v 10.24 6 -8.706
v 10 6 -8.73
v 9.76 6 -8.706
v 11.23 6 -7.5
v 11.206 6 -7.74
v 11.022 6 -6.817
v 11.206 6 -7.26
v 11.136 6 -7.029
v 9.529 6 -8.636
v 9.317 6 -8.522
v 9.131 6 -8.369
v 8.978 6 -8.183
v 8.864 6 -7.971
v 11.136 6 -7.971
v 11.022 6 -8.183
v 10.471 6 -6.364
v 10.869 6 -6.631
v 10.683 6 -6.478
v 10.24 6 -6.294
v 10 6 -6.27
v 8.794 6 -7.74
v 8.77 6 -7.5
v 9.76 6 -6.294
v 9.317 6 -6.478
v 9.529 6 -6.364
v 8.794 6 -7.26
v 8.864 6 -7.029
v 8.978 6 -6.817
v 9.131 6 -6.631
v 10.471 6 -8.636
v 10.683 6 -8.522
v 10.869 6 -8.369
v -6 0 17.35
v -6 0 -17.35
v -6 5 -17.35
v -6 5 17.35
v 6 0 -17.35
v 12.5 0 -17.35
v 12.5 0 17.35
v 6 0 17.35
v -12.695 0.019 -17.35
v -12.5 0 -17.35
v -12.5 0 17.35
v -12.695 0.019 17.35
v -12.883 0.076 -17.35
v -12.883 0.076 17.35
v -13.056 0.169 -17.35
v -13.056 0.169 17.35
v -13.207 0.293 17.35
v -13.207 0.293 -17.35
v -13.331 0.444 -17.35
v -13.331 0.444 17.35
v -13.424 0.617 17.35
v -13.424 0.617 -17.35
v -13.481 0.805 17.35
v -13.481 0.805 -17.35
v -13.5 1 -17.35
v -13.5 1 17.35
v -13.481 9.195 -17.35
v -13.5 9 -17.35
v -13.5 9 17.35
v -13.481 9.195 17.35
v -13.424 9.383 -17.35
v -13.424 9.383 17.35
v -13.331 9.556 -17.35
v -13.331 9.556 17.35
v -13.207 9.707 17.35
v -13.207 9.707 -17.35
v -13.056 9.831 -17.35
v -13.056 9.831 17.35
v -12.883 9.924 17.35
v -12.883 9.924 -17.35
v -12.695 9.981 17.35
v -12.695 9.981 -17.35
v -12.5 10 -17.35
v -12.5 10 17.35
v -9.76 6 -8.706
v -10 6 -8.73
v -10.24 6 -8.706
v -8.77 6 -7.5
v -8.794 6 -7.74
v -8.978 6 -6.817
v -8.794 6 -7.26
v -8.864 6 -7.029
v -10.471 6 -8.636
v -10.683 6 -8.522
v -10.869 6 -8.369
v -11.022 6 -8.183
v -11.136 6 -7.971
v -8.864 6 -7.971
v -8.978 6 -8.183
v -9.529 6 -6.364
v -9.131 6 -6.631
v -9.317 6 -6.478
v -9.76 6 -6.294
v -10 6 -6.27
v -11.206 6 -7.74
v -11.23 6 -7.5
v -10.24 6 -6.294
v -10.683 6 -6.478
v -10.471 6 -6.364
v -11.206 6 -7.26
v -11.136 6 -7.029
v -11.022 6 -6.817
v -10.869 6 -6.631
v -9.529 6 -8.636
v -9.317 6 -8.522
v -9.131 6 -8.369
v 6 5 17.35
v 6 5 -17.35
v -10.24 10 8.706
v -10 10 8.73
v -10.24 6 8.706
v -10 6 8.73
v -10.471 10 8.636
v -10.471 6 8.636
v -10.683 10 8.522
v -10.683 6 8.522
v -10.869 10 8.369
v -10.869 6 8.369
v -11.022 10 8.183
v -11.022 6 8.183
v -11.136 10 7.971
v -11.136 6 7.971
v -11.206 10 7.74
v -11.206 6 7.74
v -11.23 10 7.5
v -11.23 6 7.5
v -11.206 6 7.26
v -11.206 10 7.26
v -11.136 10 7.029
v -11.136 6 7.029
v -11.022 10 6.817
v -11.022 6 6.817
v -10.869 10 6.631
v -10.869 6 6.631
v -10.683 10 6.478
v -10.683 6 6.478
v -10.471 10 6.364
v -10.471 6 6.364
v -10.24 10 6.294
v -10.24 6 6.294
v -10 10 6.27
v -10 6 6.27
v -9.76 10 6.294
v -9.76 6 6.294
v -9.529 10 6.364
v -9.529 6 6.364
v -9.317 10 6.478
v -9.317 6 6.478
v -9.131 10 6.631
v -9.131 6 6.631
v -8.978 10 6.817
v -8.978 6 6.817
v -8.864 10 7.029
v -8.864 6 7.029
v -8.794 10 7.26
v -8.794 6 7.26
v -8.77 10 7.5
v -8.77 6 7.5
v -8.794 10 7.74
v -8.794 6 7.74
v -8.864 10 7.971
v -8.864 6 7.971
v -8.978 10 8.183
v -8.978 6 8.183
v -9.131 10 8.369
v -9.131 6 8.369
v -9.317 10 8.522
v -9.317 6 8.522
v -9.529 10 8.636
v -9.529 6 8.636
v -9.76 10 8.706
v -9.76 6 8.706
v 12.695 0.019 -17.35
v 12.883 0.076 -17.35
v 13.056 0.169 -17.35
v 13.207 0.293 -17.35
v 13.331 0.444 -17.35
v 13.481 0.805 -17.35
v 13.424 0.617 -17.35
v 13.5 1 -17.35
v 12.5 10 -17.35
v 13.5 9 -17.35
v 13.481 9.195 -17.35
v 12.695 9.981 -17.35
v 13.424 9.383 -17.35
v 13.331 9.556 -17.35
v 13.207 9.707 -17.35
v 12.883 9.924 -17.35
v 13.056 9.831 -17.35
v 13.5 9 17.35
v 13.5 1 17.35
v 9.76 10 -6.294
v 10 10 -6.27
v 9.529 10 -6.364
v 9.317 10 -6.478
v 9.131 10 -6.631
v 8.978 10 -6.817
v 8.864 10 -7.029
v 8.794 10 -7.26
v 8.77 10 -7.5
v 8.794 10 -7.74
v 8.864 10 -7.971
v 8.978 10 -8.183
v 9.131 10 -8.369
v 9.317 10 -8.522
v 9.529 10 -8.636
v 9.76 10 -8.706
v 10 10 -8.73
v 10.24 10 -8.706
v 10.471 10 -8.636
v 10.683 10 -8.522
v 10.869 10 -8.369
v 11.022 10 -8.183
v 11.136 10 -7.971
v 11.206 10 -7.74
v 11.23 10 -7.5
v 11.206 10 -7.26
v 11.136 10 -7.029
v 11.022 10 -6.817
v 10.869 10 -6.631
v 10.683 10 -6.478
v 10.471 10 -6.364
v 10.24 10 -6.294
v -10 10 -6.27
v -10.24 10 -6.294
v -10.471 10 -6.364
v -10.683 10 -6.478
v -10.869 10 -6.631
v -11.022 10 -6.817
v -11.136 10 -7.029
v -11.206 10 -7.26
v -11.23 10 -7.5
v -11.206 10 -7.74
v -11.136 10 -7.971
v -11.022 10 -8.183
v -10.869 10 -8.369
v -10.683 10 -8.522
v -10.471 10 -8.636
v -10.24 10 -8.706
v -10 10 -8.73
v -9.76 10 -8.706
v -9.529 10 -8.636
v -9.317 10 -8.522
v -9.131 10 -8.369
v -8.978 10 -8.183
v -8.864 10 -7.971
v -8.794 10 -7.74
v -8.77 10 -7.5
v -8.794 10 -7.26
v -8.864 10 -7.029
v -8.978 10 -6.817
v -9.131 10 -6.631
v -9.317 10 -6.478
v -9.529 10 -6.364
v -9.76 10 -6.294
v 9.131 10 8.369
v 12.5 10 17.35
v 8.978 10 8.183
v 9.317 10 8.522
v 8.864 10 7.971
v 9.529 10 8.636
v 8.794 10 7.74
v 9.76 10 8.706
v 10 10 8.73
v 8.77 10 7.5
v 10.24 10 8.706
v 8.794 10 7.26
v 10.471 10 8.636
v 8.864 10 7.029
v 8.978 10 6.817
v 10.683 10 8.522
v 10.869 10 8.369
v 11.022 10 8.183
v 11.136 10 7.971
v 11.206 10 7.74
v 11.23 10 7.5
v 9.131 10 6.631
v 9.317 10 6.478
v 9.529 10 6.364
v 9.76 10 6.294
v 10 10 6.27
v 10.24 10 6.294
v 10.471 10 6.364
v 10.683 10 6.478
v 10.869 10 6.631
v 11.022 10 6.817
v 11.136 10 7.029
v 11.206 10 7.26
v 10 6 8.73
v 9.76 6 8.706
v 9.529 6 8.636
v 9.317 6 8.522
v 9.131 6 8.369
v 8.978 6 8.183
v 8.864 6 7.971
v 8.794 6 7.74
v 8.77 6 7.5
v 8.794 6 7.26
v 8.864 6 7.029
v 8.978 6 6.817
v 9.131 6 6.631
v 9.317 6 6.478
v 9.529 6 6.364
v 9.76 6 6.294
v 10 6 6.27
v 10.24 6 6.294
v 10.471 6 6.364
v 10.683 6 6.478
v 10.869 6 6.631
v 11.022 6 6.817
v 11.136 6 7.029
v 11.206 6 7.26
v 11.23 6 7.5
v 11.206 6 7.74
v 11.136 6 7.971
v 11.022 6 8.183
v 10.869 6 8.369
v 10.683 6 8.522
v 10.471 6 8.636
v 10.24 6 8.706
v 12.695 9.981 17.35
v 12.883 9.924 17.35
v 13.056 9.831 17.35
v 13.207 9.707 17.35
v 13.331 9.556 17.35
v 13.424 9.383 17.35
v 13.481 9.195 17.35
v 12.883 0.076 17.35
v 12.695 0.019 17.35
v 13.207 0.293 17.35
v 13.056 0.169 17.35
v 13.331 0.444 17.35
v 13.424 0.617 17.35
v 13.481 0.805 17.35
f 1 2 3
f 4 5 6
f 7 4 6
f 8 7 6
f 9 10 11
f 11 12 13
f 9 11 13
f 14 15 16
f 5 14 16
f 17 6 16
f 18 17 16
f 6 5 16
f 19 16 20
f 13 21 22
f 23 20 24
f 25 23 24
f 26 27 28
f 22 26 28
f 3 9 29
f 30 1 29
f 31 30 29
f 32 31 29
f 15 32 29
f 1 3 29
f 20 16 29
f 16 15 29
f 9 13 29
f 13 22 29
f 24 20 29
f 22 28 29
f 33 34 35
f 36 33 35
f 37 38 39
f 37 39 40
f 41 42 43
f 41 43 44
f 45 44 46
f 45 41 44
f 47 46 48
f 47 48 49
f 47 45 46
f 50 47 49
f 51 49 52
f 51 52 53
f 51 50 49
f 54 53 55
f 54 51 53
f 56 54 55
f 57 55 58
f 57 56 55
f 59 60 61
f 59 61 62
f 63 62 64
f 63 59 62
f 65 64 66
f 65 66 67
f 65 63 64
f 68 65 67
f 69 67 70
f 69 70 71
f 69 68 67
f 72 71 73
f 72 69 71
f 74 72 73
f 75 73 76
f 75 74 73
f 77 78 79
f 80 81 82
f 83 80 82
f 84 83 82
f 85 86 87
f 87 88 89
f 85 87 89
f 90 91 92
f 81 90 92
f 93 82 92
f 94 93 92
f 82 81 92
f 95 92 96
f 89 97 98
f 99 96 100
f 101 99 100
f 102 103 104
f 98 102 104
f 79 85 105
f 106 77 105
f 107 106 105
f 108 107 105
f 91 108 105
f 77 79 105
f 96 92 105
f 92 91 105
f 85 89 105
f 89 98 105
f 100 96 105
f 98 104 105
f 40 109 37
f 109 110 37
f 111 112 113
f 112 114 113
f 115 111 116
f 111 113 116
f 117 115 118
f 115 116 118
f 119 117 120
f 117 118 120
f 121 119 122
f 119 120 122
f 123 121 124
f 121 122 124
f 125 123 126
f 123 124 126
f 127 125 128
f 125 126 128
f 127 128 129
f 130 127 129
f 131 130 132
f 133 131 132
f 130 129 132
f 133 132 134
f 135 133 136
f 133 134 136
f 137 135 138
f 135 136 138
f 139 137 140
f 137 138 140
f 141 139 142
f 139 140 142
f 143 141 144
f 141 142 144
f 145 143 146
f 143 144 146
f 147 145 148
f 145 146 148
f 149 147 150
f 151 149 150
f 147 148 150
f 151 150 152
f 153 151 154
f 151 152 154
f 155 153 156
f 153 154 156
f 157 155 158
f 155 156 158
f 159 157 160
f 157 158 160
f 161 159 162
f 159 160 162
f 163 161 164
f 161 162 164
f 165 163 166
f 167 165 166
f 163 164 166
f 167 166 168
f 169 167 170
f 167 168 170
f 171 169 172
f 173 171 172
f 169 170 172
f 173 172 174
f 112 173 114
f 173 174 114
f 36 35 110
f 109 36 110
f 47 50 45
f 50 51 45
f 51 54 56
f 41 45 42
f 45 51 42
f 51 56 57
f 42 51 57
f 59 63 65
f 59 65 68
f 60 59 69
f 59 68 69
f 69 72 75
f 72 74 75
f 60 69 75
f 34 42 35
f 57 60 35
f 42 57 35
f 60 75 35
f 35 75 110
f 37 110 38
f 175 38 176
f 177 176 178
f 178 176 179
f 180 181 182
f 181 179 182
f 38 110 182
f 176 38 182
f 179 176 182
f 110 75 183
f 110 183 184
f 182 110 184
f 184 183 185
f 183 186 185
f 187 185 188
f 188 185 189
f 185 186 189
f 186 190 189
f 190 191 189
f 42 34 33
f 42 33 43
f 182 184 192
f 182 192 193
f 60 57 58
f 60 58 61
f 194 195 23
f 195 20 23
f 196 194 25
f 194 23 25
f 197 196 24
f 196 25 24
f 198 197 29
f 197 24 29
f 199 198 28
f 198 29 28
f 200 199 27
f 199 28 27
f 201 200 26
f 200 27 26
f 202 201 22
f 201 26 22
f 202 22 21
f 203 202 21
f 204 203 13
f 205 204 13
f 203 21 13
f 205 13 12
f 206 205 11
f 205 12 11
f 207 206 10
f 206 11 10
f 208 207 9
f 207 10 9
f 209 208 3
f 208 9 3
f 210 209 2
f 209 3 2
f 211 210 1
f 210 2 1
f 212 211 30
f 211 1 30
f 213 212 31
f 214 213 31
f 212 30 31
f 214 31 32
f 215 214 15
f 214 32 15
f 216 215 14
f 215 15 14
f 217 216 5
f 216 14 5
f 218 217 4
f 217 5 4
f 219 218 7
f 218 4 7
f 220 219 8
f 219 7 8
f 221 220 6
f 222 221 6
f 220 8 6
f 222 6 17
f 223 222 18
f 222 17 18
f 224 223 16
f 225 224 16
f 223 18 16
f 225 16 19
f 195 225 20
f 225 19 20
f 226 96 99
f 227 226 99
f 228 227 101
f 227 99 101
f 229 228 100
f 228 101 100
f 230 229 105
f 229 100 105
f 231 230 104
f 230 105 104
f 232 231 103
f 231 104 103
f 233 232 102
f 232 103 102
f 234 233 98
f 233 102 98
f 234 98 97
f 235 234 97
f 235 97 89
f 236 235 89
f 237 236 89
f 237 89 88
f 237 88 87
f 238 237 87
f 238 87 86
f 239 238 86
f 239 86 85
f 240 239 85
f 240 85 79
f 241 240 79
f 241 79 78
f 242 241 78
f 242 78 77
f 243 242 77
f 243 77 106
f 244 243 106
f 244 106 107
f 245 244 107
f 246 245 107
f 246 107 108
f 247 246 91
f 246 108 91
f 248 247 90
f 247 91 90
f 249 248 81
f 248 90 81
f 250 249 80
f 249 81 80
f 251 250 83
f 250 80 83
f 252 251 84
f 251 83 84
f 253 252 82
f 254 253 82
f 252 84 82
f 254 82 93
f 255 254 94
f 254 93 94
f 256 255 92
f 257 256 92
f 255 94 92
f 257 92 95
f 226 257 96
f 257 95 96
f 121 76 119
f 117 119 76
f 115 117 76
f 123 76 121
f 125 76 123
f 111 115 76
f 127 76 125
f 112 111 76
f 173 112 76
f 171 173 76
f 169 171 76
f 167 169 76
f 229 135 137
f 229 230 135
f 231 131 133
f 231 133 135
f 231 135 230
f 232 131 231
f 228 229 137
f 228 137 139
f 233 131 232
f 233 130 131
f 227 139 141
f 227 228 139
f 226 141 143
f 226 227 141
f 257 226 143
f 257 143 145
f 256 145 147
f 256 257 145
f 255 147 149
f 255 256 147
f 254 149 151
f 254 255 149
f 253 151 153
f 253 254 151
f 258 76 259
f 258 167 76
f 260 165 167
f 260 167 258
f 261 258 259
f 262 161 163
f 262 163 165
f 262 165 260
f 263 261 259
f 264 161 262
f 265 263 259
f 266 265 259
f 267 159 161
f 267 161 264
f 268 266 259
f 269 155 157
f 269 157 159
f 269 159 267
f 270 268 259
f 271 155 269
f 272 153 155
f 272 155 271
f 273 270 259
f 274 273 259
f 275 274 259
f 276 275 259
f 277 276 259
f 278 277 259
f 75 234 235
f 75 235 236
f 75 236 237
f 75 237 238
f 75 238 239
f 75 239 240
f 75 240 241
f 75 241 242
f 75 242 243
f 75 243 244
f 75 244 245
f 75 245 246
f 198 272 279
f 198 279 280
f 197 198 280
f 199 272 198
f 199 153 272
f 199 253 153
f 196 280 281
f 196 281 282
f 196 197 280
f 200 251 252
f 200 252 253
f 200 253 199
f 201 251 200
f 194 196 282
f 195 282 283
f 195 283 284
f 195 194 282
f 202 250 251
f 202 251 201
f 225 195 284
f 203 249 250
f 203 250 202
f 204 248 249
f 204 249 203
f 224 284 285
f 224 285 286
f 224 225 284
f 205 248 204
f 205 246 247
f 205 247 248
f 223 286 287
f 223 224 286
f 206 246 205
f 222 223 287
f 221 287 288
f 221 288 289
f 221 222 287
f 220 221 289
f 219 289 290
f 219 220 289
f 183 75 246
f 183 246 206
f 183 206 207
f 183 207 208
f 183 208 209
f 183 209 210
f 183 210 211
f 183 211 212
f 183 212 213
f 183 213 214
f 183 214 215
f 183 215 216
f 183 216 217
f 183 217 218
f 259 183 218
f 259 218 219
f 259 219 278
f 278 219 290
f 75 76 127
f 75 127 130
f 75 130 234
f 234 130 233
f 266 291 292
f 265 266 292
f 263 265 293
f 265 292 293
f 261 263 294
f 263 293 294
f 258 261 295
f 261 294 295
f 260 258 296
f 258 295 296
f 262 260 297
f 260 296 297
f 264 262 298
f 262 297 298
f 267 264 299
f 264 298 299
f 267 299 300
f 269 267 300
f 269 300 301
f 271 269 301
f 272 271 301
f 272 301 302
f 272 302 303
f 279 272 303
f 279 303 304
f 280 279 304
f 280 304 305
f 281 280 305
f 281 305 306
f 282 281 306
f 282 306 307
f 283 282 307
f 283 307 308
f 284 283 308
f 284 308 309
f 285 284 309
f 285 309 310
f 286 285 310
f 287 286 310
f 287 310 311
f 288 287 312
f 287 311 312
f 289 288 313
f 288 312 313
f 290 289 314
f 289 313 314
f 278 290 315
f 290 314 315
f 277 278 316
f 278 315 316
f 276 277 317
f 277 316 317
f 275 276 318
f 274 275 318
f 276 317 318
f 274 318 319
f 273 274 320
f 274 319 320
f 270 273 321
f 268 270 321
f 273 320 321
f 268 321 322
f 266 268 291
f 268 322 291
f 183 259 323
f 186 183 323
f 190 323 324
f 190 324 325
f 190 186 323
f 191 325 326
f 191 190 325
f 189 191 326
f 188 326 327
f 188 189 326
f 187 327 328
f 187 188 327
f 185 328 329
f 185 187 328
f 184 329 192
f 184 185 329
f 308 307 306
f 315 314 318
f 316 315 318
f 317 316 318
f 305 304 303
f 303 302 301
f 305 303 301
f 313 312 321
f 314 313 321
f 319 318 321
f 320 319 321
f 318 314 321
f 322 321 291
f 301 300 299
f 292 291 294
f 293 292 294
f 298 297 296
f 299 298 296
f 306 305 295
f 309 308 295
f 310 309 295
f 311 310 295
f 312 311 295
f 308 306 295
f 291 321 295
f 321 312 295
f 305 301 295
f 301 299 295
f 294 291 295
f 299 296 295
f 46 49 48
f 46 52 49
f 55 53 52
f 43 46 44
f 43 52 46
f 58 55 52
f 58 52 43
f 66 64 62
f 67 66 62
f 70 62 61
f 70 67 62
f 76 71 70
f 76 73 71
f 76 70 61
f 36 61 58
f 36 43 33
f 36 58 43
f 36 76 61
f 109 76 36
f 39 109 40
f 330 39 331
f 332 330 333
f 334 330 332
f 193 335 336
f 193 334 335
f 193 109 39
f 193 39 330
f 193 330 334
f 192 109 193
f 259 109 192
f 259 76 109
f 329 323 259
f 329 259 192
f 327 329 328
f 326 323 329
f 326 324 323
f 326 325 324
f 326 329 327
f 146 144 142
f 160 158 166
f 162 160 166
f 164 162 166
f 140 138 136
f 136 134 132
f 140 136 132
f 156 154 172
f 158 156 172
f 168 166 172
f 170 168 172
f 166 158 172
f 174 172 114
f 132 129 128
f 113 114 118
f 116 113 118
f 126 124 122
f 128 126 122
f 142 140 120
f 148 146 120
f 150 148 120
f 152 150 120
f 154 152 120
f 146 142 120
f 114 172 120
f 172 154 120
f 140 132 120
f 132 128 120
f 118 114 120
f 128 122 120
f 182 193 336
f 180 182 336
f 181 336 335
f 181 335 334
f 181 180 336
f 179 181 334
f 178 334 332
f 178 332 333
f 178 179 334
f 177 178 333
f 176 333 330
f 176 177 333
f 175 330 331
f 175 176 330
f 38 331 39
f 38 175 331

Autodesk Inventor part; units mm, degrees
ref_plane "YZ Plane" through (0, 0, 0) normal (1, 0, 0) x (0, 1, 0)
ref_plane "XZ Plane" through (0, 0, 0) normal (0, 1, 0) x (-1, 0, 0)
ref_plane "XY Plane" through (0, 0, 0) normal (0, 0, 1) x (1, 0, 0)
sketch "Sketch1" plane through (0, 0, 0) normal (0, 0, 1) x (1, 0, 0)
  line L0 (-6, 5) -> (6, 5)
  line L1 (6, 5) -> (6, 0)
  line L2 (6, 0) -> (-6, 0)
  line L3 (-6, 0) -> (-6, 5)
  line L4 (-6, 5) -> (6, 0) construction
  line L5 (6, 5) -> (-6, 0) construction
  line L6 (-13.5, 10) -> (13.5, 10)
  line L7 (13.5, 10) -> (13.5, 0)
  line L8 (13.5, 0) -> (-13.5, 0)
  line L9 (-13.5, 0) -> (-13.5, 10)
  line L10 (-13.5, 10) -> (13.5, 0) construction
  line L11 (13.5, 10) -> (-13.5, 0) construction
  point P0 (0, 0)
  point P1 (0, 2.5)
  point P2 (0, 0)
  point P3 (0, 5)
  point P4 (6, 0)
  point P5 (-6, 0)
  dimension "d0" = 12
  dimension "d1" = 5
  dimension "d2" = 27
  dimension "d3" = 10
extrude "Extrusion1" add sketch "Sketch1" along normal mid plane 34.7 contours L3 L8 L9 L6 L7 L1 L0
sketch "Sketch2" plane through (-13.5, 10, 17.35) normal (0, 1, 0) x (1, 0, 0)
  line L0 (23.5, 9.85) -> (3.5, 9.85) construction
  line L1 (3.5, 9.85) -> (3.5, 24.85) construction
  line L2 (3.5, 24.85) -> (23.5, 24.85) construction
  line L3 (23.5, 24.85) -> (23.5, 9.85) construction
  line L4 (23.5, 9.85) -> (3.5, 24.85) construction
  line L5 (3.5, 9.85) -> (23.5, 24.85) construction
  point P0 (13.5, 17.35)
  dimension "d6" = 20
  dimension "d7" = 15
hole "Hole1" at (-10, 10, 7.5) at (10, 10, 7.5) at (10, 10, -7.5) at (-10, 10, -7.5) direction (0, -1, 0) diameter 2.459 depth 4 thread size "M3x0.5" class "6H" standard "ISO Metric profile"
fillet "Fillet1" radius 1 4 edges at (13.5, 10, 0) (-13.5, 10, 0) (13.5, 0, 0) (-13.5, 0, 0)
properties part number "MGN12C Cart" material "Steel, Carbon"
